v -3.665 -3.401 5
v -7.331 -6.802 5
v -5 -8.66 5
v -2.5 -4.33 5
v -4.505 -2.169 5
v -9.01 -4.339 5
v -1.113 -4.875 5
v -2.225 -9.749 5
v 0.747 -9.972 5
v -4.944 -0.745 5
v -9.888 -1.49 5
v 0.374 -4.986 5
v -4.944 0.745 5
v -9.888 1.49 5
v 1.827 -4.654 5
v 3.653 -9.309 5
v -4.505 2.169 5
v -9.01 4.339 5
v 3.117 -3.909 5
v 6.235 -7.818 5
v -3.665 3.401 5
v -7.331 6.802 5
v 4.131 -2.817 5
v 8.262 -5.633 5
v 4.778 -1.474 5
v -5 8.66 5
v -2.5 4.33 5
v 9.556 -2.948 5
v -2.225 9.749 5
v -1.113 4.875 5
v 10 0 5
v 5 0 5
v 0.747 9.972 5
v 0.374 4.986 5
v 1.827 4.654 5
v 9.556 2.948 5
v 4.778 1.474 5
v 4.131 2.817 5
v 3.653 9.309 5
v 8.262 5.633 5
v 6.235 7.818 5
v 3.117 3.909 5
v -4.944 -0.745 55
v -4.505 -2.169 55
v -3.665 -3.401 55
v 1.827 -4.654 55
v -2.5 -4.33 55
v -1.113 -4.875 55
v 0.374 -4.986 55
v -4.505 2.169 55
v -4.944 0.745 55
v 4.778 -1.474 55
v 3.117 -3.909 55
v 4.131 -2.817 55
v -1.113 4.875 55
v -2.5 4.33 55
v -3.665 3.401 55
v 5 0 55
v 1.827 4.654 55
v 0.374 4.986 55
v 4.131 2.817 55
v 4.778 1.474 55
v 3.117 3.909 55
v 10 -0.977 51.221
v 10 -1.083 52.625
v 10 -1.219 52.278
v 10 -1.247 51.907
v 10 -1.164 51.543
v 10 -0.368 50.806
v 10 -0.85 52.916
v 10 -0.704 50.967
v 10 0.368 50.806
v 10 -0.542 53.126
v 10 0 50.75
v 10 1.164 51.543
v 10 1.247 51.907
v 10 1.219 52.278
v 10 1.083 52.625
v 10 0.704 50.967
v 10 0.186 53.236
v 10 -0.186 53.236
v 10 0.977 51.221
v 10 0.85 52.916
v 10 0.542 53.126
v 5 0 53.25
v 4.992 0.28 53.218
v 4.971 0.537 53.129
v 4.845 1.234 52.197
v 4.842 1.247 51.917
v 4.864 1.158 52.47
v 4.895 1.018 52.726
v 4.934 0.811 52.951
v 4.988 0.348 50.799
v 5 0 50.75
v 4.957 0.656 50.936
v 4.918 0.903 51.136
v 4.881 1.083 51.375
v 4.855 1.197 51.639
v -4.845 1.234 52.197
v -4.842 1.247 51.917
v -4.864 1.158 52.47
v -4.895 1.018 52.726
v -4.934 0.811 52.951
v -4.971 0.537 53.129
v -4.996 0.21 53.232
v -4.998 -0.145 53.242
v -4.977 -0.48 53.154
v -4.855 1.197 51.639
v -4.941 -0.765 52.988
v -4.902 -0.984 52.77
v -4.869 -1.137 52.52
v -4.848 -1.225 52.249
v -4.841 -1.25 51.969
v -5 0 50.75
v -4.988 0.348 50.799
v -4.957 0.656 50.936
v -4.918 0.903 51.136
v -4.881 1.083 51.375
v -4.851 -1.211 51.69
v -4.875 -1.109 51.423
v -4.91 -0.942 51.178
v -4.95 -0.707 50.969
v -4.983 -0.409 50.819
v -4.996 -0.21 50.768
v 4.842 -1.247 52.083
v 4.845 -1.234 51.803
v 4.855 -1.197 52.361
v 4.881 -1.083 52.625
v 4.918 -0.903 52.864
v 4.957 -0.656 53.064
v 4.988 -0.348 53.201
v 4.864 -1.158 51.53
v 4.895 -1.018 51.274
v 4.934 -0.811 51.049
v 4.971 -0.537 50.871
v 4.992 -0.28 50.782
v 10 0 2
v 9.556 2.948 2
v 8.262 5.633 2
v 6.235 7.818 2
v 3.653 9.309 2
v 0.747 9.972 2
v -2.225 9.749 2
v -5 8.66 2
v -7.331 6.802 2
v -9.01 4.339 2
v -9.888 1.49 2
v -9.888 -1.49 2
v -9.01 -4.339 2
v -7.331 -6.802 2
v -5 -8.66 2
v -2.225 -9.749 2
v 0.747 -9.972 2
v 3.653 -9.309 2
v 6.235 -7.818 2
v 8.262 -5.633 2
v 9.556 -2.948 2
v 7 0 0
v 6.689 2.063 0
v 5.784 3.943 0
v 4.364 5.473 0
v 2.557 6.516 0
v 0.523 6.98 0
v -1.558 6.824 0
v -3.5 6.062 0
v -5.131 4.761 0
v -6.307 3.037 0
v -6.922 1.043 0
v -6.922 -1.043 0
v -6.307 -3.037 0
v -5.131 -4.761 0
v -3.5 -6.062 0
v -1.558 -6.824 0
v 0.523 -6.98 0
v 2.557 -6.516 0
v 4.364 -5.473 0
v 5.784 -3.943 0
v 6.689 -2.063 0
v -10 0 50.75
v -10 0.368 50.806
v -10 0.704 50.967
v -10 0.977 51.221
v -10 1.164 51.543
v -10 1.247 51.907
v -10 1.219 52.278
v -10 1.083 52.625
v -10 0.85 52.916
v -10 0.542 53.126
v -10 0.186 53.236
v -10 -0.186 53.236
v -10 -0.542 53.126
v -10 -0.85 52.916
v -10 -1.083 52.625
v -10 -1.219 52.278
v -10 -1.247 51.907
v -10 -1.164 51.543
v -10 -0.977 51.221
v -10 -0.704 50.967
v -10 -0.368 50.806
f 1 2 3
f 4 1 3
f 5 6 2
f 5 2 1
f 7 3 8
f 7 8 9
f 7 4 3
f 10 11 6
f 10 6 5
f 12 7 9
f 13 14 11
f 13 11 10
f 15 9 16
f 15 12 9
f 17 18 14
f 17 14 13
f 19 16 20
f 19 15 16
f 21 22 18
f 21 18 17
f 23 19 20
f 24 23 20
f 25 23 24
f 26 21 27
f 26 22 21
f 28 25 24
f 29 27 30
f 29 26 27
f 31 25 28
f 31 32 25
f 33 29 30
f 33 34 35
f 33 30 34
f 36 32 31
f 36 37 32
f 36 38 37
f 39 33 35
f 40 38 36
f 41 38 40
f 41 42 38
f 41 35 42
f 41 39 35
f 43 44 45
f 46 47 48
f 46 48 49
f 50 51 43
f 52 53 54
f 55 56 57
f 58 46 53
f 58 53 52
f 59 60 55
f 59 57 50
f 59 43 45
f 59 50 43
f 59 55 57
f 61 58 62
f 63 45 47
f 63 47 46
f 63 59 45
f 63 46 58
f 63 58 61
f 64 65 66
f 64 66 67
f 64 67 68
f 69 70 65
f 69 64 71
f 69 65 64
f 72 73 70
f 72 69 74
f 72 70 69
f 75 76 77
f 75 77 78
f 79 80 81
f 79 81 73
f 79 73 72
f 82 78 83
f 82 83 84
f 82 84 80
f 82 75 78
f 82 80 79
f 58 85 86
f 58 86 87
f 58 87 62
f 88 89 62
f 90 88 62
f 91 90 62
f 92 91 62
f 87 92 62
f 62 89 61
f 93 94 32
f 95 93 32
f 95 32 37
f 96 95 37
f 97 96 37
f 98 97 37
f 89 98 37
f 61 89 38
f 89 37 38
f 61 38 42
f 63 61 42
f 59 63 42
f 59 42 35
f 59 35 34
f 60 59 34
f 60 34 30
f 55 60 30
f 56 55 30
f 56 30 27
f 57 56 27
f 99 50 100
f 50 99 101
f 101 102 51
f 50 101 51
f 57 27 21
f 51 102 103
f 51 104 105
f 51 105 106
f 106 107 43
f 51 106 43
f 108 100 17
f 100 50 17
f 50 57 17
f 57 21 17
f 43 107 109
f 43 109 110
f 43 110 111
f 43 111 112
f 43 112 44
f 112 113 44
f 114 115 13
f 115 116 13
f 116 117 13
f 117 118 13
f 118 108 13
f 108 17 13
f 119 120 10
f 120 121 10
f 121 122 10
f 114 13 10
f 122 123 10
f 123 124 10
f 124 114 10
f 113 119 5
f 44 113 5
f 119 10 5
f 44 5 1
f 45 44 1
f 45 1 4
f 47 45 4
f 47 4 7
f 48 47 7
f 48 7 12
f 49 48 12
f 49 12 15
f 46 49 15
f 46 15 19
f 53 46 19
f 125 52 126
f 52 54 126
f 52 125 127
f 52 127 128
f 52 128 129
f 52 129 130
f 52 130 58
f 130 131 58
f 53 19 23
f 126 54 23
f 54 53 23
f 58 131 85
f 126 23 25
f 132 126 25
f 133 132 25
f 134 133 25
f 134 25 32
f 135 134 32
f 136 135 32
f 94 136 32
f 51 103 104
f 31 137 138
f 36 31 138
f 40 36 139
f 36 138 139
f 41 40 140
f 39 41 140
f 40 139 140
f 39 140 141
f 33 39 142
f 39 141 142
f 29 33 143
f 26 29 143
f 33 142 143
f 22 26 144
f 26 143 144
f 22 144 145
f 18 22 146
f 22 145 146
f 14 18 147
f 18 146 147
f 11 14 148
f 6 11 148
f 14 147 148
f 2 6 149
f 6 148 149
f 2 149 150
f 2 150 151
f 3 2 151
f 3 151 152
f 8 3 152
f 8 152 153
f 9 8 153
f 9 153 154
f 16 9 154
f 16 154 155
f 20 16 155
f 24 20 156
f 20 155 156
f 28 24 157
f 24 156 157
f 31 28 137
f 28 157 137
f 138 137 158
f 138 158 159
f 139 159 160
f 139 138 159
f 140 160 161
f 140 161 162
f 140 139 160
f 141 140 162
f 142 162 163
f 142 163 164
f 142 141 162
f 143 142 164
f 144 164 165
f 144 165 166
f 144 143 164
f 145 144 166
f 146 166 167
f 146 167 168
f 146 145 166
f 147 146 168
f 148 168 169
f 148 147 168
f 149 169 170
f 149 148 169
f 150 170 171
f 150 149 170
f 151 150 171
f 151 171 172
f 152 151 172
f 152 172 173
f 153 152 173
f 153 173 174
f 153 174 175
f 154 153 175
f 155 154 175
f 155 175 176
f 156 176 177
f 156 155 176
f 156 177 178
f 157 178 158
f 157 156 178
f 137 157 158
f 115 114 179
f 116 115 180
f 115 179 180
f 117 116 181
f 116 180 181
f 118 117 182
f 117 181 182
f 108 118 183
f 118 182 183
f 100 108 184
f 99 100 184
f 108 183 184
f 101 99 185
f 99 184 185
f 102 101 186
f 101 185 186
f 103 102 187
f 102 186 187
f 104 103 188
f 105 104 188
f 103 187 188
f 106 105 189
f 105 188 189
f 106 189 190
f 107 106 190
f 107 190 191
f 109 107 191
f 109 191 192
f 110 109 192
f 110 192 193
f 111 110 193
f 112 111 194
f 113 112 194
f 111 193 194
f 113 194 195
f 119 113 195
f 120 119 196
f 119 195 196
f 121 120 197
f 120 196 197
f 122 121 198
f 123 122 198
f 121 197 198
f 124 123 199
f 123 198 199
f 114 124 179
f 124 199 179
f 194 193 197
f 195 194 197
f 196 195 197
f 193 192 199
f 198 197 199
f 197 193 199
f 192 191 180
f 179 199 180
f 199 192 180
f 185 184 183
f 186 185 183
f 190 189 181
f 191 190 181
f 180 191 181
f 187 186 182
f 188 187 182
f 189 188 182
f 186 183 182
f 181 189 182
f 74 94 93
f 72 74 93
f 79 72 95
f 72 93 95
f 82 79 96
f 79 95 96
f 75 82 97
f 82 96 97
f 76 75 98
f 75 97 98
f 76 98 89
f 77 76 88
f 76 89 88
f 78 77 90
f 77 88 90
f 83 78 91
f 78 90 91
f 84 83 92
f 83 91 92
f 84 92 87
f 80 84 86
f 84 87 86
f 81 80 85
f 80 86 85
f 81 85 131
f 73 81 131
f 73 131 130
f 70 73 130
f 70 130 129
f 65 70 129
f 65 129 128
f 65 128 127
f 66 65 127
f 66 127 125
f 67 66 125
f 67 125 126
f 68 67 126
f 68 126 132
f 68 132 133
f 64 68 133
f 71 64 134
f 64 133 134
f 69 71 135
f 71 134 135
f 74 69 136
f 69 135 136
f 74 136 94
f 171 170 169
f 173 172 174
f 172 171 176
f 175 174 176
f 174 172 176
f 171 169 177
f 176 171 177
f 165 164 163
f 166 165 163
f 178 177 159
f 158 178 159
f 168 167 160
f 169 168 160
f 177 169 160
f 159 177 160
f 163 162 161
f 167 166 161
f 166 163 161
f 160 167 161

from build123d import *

# Parameters (mm, degrees)
SKETCH1_R                = 10
SKETCH1_R_2              = 5
BOSS_EXTRUDE1_DEPTH      = 5
SKETCH1_2_R              = 5
BOSS_EXTRUDE2_DEPTH      = 55
CHAMFER1_SIZE            = 3
CHAMFER1_SIZE2           = 2
BOSS_EXTRUDE3_DEPTH      = 10
BOSS_EXTRUDE3_DEPTH_BACK = 10
SKETCH2_R                = 1.25


with BuildPart() as part:
    # Sketch1 → Boss-Extrude1 (new body)
    with BuildSketch(Plane.XY):
        Circle(SKETCH1_R)
        Circle(SKETCH1_R_2, mode=Mode.SUBTRACT)
    extrude(amount=BOSS_EXTRUDE1_DEPTH)

    # Sketch1<2> → Boss-Extrude2 (add)
    with BuildSketch(Plane.XY):
        Circle(SKETCH1_2_R)
    extrude(amount=BOSS_EXTRUDE2_DEPTH)

    # Chamfer1
    chamfer1_edges = [part.edges().sort_by_distance(p)[0] for p in [
        (-10, 0, 0),
    ]]
    chamfer1_side = [part.faces().sort_by_distance(p)[0] for p in [
        (0, 0, 0),
    ]]
    chamfer(chamfer1_edges, length=CHAMFER1_SIZE, length2=CHAMFER1_SIZE2, reference=chamfer1_side[0])

    # Sketch2 → Boss-Extrude3 (add, two sides: drawn at the far end of the back side and taken through both)
    with BuildSketch(Plane(origin=(0, 0, 0), x_dir=(0, 0, -1), z_dir=(1, 0, 0)).offset(-BOSS_EXTRUDE3_DEPTH_BACK)):
        with Locations((-52, 0)):
            Circle(SKETCH2_R)
    extrude(amount=BOSS_EXTRUDE3_DEPTH + BOSS_EXTRUDE3_DEPTH_BACK)


solid = part.part
